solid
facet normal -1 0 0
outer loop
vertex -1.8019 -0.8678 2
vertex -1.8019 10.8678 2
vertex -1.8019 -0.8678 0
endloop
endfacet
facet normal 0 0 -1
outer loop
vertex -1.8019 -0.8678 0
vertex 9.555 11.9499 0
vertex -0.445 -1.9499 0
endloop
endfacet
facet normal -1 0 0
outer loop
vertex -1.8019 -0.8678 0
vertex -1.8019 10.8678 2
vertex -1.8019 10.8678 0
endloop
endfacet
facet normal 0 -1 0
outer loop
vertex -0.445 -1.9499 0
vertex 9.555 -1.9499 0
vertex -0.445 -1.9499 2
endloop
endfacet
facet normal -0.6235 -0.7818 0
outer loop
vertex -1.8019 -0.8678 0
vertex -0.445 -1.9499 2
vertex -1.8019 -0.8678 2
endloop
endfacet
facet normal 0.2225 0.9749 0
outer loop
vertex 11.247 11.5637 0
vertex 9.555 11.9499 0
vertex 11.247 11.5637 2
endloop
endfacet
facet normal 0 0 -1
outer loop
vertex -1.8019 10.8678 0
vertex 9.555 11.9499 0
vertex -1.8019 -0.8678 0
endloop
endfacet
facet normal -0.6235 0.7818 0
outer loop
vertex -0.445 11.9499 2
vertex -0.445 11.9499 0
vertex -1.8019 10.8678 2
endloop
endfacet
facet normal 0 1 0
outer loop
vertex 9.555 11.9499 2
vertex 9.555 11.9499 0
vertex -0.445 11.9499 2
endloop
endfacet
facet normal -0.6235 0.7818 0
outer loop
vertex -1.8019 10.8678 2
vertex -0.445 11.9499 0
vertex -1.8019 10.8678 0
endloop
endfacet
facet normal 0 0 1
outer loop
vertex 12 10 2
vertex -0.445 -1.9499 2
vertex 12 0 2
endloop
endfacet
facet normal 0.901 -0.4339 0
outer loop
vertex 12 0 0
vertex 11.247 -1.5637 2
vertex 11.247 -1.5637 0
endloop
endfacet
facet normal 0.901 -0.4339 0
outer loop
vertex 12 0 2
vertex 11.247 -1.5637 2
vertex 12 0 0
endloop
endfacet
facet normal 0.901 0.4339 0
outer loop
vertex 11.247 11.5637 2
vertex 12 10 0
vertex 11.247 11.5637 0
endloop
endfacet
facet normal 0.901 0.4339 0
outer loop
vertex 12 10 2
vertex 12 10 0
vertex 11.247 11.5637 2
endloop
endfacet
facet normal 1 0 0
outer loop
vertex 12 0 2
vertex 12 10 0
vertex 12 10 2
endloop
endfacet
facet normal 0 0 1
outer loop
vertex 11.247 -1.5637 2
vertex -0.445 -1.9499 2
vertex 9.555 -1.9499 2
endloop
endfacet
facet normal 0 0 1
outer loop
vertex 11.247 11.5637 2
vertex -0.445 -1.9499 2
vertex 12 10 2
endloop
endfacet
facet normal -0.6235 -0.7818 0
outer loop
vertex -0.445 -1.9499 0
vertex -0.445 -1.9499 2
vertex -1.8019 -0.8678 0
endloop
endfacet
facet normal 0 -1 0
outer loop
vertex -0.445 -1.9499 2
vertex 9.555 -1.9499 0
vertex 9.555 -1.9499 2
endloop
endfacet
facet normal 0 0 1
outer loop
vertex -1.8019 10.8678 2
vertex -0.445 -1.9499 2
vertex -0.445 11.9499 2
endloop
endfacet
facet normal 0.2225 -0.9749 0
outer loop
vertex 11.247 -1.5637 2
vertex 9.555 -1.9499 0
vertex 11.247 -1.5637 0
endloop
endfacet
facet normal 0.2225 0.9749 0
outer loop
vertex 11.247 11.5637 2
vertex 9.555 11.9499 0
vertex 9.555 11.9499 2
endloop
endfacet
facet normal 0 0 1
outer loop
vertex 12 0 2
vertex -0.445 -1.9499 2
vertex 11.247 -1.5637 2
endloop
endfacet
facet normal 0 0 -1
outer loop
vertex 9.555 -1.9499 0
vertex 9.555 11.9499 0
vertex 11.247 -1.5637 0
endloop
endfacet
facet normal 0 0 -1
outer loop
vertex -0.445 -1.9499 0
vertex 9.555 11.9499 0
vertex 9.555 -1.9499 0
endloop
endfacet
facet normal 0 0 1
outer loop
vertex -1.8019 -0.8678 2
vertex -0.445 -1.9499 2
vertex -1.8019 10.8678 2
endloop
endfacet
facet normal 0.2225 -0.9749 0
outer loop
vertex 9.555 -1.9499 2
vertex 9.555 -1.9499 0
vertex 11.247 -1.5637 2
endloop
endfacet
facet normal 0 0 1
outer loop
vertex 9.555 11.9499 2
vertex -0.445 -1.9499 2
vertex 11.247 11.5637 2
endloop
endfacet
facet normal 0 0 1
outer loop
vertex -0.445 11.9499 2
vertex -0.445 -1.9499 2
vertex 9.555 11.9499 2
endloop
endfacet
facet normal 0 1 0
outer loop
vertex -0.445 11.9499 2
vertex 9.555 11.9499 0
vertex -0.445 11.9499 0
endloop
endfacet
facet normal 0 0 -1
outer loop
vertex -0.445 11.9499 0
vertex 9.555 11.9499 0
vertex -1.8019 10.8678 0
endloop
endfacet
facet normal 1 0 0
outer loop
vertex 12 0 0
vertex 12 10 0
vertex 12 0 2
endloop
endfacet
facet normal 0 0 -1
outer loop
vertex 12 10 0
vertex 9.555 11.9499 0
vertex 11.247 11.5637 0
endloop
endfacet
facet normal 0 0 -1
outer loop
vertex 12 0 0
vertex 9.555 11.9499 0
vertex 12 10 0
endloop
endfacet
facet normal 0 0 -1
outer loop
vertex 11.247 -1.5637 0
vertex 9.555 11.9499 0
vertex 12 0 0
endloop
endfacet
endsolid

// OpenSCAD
// Unit of length: Unit.MM
minkowski()
{
   cube(size = [10.0, 10.0, 1.0], center = false);
   cylinder(h = 1.0, r = 2.0, center = false);
}
